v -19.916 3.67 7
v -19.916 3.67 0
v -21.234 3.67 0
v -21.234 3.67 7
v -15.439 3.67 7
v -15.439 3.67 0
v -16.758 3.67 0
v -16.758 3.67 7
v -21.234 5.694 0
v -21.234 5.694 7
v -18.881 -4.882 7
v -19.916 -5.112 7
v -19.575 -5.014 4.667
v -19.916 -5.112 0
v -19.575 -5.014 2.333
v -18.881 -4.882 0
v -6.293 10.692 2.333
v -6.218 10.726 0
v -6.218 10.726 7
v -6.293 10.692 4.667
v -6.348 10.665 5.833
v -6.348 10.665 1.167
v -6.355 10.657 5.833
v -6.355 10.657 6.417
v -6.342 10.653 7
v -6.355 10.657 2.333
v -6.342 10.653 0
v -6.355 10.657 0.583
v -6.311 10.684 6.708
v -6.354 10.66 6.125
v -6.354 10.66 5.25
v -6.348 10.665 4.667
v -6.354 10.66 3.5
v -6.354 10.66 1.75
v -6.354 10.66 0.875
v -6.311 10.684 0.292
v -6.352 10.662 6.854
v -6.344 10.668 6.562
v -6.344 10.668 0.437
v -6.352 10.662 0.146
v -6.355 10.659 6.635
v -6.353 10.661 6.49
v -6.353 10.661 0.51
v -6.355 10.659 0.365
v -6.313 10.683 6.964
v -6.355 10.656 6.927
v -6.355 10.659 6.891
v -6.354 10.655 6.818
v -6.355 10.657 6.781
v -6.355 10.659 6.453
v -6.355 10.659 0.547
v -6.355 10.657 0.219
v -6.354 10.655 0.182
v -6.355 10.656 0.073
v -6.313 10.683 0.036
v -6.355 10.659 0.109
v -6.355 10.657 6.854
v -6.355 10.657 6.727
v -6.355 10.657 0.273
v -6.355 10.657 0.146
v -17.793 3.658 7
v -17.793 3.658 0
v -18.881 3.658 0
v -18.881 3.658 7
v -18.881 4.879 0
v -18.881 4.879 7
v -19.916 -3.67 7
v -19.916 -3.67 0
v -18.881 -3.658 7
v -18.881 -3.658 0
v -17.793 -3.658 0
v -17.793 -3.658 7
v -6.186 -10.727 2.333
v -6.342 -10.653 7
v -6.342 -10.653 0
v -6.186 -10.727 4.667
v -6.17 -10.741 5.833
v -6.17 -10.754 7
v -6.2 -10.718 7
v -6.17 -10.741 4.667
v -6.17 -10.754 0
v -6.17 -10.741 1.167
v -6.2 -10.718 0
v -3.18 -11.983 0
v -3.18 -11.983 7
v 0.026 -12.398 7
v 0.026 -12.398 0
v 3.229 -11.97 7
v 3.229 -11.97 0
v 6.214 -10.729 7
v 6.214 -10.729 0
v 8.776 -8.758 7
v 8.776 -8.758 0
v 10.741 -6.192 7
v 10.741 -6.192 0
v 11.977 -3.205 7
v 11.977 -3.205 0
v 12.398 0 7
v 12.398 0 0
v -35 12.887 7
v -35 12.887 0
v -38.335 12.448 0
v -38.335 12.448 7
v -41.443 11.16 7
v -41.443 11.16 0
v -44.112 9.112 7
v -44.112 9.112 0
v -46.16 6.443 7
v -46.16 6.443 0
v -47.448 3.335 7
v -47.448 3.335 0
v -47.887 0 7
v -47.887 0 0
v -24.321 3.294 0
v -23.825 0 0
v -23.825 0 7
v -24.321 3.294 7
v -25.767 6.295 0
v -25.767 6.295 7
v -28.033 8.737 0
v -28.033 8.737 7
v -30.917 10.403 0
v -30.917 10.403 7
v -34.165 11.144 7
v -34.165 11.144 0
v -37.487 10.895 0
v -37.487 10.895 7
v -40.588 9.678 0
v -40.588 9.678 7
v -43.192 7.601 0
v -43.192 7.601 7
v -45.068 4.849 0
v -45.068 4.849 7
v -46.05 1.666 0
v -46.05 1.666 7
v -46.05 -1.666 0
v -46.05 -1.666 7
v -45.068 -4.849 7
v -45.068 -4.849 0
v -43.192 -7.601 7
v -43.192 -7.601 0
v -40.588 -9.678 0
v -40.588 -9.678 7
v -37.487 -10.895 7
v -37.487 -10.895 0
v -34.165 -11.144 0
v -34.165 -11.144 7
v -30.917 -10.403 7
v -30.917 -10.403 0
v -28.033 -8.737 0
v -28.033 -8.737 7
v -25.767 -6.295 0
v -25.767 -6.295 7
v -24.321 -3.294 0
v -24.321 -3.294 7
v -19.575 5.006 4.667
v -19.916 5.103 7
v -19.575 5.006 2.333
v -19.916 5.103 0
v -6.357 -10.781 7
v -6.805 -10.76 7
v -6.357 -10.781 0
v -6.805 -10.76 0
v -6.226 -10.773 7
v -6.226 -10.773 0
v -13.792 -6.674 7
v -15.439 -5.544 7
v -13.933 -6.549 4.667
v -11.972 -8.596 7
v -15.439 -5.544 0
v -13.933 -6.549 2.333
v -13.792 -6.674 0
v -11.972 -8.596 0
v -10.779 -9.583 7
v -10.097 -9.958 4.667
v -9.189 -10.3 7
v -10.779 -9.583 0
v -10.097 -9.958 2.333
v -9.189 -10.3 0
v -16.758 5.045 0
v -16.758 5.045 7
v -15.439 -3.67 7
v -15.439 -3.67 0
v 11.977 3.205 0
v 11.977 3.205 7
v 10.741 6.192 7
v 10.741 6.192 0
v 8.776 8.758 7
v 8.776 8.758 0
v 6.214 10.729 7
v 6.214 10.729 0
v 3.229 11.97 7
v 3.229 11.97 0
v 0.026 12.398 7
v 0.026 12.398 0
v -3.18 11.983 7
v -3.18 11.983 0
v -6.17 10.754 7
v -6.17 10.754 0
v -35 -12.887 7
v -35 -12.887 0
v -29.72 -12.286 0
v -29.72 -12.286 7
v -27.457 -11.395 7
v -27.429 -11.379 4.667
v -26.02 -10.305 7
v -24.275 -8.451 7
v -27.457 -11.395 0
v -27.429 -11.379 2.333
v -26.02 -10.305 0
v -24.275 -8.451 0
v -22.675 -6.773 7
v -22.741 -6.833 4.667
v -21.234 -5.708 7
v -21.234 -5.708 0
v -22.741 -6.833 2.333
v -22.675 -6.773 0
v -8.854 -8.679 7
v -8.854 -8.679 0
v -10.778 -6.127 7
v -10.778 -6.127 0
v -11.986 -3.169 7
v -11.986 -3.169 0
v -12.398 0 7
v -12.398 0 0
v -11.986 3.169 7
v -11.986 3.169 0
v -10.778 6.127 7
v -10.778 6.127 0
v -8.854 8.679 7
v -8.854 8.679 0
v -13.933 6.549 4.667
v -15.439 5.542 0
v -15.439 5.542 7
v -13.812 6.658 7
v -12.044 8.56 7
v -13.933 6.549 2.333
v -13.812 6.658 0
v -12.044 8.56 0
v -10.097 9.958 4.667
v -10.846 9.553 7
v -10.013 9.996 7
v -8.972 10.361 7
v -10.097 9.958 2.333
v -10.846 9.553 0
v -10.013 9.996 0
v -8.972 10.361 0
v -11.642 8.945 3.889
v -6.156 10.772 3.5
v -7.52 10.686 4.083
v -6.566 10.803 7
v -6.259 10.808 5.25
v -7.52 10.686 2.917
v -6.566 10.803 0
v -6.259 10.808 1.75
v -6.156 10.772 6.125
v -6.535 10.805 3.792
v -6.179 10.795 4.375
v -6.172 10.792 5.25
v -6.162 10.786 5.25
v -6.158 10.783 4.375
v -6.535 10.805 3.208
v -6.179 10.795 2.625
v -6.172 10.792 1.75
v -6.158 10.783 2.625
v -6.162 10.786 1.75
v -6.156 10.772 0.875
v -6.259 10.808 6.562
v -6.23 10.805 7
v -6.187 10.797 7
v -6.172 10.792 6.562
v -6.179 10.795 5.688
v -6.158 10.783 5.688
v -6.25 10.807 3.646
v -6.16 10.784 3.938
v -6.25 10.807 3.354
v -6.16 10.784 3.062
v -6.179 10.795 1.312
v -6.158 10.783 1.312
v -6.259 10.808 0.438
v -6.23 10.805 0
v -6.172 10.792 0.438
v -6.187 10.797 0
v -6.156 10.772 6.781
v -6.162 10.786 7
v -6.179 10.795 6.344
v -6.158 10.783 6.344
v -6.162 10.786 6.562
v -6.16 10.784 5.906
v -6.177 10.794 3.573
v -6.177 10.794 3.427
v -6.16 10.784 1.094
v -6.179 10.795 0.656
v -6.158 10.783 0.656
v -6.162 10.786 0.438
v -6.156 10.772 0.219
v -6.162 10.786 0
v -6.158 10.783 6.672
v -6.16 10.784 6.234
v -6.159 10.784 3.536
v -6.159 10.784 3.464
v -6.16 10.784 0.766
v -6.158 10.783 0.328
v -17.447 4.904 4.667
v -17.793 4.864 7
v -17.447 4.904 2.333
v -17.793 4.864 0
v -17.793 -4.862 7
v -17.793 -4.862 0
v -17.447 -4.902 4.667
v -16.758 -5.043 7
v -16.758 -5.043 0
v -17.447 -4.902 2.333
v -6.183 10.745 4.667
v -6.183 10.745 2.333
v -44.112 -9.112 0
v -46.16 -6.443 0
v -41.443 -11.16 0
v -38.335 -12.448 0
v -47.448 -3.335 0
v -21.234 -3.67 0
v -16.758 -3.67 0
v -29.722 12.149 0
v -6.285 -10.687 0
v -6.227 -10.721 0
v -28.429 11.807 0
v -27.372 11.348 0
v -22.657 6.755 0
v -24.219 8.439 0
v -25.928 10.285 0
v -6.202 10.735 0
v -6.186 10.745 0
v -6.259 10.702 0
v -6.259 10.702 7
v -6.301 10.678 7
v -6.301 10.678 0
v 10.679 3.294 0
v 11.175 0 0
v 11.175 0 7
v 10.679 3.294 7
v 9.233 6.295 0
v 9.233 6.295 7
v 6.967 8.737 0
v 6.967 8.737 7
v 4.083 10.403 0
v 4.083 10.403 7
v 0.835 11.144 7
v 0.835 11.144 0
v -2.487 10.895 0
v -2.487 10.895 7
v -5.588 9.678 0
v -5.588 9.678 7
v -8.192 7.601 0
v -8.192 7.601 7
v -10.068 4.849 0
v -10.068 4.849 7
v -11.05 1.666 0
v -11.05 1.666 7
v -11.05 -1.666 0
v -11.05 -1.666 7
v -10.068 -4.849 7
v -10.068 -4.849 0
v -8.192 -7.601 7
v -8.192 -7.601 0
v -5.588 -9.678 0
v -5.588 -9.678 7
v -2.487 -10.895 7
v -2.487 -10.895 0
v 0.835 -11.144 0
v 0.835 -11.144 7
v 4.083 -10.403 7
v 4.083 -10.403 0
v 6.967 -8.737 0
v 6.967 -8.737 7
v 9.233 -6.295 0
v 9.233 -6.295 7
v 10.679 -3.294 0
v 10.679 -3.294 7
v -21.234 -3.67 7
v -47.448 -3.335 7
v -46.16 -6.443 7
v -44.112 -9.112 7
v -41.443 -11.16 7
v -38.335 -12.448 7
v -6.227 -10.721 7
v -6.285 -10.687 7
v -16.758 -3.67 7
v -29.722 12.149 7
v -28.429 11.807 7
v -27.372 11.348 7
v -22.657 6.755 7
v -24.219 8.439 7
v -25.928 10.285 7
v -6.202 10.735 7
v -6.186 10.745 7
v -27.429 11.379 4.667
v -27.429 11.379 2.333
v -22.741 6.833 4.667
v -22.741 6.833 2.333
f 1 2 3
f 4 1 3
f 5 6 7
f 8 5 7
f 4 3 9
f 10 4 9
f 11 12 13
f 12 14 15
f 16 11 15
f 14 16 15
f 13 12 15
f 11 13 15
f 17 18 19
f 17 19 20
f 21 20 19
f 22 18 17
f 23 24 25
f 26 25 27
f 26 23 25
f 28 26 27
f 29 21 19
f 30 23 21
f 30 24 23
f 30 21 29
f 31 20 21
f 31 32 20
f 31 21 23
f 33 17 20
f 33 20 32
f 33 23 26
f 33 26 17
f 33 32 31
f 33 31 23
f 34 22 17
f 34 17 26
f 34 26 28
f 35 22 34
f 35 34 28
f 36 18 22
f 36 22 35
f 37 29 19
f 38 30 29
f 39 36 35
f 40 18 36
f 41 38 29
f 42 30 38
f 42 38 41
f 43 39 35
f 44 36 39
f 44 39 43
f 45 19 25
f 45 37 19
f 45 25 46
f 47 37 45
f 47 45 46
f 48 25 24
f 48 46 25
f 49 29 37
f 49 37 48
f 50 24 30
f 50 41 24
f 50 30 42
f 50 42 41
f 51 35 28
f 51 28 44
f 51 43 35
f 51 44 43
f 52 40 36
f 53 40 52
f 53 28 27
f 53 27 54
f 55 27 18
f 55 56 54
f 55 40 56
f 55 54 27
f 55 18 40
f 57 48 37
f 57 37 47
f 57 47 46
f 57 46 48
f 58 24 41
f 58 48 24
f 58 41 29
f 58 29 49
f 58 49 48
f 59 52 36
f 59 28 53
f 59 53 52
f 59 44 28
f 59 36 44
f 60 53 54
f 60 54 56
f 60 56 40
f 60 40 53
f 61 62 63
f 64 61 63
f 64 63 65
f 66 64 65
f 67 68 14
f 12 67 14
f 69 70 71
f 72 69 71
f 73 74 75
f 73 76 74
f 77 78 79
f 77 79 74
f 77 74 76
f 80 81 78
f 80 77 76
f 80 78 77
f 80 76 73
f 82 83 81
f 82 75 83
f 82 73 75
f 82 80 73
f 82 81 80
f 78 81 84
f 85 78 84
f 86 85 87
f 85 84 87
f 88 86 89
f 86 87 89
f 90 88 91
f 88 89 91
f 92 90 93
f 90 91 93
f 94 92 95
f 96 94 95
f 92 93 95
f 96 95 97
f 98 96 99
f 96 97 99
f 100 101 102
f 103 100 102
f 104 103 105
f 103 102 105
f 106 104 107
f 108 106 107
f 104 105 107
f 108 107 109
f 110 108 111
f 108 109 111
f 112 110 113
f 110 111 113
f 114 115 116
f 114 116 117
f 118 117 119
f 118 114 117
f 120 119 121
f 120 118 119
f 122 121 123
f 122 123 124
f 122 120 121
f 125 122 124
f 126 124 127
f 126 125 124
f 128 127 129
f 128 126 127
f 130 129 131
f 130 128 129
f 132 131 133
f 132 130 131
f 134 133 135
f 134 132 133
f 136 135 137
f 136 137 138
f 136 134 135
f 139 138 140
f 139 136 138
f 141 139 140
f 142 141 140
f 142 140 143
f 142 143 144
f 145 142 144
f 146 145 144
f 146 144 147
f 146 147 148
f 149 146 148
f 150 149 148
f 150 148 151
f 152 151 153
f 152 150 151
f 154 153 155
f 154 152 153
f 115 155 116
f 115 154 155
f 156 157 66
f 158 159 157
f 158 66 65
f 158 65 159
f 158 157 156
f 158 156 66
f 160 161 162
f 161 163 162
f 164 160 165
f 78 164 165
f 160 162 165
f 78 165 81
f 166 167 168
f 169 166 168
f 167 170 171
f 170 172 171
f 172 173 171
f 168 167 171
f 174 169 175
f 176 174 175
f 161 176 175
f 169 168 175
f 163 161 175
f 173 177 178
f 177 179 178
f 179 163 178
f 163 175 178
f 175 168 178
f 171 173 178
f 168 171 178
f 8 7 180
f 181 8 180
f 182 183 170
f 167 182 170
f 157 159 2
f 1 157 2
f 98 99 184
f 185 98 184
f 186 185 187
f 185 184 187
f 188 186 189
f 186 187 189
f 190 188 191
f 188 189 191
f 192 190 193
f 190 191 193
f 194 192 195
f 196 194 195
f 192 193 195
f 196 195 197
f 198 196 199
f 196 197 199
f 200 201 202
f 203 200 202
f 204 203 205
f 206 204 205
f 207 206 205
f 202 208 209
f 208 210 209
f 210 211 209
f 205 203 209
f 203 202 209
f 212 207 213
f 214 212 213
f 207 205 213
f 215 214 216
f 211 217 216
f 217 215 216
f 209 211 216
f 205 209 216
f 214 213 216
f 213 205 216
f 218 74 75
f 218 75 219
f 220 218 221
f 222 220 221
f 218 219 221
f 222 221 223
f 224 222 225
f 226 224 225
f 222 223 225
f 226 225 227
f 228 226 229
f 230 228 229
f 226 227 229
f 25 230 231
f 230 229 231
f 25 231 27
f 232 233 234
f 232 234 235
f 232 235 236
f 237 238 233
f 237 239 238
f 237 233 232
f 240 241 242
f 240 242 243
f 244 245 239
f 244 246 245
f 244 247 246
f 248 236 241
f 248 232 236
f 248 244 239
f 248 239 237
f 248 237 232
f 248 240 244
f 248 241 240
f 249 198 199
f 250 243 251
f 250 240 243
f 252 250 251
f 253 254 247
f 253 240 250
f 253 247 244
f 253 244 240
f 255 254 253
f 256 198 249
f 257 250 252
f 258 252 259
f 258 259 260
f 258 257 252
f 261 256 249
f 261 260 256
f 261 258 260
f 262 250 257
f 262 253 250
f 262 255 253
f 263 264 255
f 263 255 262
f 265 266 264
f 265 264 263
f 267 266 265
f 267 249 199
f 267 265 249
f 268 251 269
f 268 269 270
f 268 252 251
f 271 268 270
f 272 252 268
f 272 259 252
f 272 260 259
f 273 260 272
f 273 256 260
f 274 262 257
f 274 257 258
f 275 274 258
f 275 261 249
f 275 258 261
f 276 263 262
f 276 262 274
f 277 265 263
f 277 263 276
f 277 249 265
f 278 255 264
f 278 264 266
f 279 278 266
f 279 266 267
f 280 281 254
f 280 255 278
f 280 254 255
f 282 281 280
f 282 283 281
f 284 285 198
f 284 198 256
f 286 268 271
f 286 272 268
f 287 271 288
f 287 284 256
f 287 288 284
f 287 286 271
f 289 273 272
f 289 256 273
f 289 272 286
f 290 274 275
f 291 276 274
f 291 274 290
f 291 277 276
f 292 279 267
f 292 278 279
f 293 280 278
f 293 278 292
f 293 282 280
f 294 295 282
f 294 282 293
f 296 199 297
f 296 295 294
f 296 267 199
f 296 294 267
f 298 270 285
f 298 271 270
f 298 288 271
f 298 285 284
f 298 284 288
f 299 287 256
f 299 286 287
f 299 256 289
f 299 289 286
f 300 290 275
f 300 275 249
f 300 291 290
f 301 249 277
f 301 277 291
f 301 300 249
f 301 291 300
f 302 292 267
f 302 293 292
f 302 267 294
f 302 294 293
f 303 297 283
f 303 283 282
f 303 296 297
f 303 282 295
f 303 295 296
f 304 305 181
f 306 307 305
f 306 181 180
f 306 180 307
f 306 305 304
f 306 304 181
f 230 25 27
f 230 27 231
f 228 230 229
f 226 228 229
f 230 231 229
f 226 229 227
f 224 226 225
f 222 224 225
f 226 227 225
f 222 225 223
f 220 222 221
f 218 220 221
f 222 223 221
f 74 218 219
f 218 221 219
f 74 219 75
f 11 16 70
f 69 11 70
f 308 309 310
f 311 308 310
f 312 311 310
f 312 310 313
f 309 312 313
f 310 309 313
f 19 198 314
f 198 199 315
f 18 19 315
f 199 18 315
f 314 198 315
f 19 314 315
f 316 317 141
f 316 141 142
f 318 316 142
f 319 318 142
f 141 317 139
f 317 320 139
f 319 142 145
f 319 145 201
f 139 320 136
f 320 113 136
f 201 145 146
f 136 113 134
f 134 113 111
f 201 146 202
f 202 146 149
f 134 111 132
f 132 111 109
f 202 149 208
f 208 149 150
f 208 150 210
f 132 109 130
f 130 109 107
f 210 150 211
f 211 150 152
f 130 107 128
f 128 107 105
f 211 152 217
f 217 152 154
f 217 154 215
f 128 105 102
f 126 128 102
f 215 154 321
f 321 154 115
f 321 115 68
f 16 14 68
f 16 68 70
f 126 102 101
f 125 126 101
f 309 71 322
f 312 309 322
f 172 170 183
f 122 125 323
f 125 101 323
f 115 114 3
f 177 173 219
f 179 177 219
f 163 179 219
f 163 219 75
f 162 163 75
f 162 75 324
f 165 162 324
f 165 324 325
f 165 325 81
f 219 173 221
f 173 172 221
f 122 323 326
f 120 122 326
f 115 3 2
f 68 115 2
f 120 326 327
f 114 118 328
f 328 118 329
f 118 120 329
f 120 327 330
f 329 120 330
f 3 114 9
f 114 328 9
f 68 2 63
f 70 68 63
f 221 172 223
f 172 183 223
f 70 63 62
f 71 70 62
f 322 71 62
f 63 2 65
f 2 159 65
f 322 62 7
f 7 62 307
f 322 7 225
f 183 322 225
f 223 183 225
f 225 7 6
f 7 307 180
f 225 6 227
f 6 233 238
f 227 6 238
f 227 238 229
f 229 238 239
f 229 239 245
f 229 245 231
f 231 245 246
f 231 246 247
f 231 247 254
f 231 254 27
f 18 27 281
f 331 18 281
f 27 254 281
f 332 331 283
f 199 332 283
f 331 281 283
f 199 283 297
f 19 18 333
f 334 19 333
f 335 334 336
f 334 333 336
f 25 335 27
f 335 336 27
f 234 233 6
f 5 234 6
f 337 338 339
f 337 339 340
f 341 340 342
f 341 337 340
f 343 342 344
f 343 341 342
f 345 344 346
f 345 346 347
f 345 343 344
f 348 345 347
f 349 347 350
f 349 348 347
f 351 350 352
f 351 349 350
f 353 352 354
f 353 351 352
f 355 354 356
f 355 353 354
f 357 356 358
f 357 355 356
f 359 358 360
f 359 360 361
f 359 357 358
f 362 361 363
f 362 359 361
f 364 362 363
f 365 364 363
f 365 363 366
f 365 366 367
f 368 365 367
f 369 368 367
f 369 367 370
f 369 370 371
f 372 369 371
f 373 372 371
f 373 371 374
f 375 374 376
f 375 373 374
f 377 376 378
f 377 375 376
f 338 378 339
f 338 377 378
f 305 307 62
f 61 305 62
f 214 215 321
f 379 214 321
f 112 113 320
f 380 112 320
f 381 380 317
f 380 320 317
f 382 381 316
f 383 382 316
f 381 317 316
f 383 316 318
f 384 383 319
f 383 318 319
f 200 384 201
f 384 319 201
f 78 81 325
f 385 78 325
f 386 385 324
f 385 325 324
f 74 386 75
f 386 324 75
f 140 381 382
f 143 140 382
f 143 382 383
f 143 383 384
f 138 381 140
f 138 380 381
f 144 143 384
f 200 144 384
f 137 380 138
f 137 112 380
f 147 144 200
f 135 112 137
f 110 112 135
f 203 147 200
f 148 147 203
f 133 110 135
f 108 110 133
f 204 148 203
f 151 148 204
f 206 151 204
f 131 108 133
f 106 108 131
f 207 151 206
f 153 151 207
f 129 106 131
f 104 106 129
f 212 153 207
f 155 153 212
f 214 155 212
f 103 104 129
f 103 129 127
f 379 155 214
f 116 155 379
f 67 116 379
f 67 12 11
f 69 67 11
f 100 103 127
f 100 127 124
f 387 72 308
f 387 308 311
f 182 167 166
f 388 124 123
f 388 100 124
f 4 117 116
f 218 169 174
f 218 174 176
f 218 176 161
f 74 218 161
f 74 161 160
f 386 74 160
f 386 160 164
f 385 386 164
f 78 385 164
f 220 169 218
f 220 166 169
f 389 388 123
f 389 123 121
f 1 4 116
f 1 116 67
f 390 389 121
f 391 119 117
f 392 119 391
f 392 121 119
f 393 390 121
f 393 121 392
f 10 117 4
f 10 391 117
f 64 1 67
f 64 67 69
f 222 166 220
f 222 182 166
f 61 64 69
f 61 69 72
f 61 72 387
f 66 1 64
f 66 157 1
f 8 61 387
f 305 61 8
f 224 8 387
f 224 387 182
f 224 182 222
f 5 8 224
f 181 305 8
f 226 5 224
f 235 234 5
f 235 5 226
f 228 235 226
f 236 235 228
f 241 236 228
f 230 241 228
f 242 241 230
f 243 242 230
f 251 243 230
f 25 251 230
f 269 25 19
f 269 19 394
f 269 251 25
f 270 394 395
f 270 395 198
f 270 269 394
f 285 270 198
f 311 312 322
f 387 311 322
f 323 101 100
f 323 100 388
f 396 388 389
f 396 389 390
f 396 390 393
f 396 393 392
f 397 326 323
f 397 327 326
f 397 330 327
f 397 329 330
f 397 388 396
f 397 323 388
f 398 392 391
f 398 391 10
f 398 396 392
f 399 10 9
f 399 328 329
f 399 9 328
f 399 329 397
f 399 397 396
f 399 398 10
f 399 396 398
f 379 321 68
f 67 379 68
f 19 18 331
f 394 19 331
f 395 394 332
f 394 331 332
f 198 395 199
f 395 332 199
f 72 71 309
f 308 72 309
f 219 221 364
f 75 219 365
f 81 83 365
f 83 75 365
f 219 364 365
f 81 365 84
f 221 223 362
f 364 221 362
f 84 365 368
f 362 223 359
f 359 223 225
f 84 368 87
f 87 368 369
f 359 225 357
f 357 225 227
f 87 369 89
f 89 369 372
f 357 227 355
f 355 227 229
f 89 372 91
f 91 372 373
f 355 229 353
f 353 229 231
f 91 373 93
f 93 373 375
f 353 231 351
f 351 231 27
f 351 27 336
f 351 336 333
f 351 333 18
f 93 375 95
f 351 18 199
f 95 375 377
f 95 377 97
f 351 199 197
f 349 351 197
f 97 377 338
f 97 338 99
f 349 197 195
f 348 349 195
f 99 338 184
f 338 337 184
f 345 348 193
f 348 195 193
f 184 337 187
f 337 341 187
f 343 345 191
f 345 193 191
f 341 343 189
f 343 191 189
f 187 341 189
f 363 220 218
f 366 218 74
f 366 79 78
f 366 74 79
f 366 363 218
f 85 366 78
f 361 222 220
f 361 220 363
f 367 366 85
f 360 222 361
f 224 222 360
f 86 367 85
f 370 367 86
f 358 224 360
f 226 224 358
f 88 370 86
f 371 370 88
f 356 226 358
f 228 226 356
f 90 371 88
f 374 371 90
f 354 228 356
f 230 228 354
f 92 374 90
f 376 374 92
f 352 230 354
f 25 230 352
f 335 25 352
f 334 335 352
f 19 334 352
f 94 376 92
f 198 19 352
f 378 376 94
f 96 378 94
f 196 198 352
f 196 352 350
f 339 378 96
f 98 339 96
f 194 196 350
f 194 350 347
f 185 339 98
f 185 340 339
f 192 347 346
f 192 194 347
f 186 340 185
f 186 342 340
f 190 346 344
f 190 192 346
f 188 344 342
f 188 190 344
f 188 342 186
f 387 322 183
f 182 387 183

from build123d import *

# Parameters (mm, degrees)
F0_R     = 11.175
F1_DEPTH = 7
F2_DEPTH = 7


with BuildPart() as f1:
    # F0 (on Top) → F1 (new body)
    with BuildSketch(Plane.XY):
        with BuildLine():
            ThreePointArc((-6.3417691643, -10.6534334759), (-12.398132156, 0), (-6.3417691643, 10.6534334759))
            add(Edge.make_bspline(
                [(-6.2182208185, 10.7260156074), (-6.2898533195, 10.6910439898), (-6.3928576009, 10.6541938208), (-6.3417691643, 10.6534334759)],
                knots=[0.9757964746, 0.9757964746, 0.9757964746, 0.9757964746, 1, 1, 1, 1], degree=3))
            ThreePointArc((-6.2182208185, 10.7260156074), (-6.1938831268, 10.7400881174), (-6.1695135877, 10.7541054045))
            add(Edge.make_bspline(
                [(-15.4393427074, 5.5421058876), (-14.8912780033, 5.8141958954), (-12.9618337257, 7.102279887), (-11.3000086923, 10.432941862), (-5.9426922893, 10.9316099021), (-6.1695135877, 10.7541054045)],
                knots=[0.6163845414, 0.6163845414, 0.6163845414, 0.6163845414, 0.673080138, 0.8301918023, 0.9690223671, 0.9690223671, 0.9690223671, 0.9690223671], degree=3))
            Line((-15.4393427074, 5.5421058876), (-15.4393427074, 3.6695655435))
            Line((-15.4393427074, 3.6695655435), (-16.7575217783, 3.6695655435))
            Line((-16.7575217783, 3.6695655435), (-16.7575217783, 5.0453083157))
            add(Edge.make_bspline(
                [(-17.7929103374, 4.8639994661), (-17.4465794205, 4.8937805268), (-17.0995805588, 4.955405242), (-16.7575217783, 5.0453083157)],
                knots=[0.5397002226, 0.5397002226, 0.5397002226, 0.5397002226, 0.5727189225, 0.5727189225, 0.5727189225, 0.5727189225], degree=3))
            Line((-17.7929103374, 4.8639994661), (-17.7929103374, 3.6582010798))
            Line((-17.7929103374, 3.6582010798), (-18.8809223473, 3.6582010798))
            Line((-18.8809223473, 3.6582010798), (-18.8809223473, 4.8793821001))
            add(Edge.make_bspline(
                [(-19.9163109064, 5.1029895365), (-19.5767359601, 4.9956990886), (-19.2311209543, 4.920305821), (-18.8809223473, 4.8793821001)],
                knots=[0.470842737, 0.470842737, 0.470842737, 0.470842737, 0.5048637742, 0.5048637742, 0.5048637742, 0.5048637742], degree=3))
            Line((-19.9163109064, 5.1029895365), (-19.9163109064, 3.6695655435))
            Line((-19.9163109064, 3.6695655435), (-21.2344899774, 3.6695655435))
            Line((-21.2344899774, 3.6695655435), (-21.2344899774, 5.6935674142))
            add(Edge.make_bspline(
                [(-35, 12.8868968785), (-32.4764058242, 12.3842750738), (-26.8328403096, 12.6124271474), (-23.8683963588, 7.6040613235), (-21.7601893659, 6.0007013665), (-21.2344899774, 5.6935674142)],
                knots=[0, 0, 0, 0, 0.1926872335, 0.3699145532, 0.4256387724, 0.4256387724, 0.4256387724, 0.4256387724], degree=3))
            ThreePointArc((-35, 12.8868968785), (-44.1124121712, 9.1124121712), (-47.8868968785, 0))
            ThreePointArc((-47.8868968785, 0), (-44.1124121712, -9.1124121712), (-35, -12.8868968785))
            add(Edge.make_bspline(
                [(-35, -12.8868968785), (-32.2373997542, -12.7407331929), (-26.9339365175, -12.4601619558), (-23.8740309058, -7.6057967092), (-21.7579622329, -6.0142972002), (-21.2344899774, -5.7083986722)],
                knots=[0, 0, 0, 0, 0.1926872335, 0.3699145532, 0.4253332887, 0.4253332887, 0.4253332887, 0.4253332887], degree=3))
            Line((-21.2344899774, -5.7083986722), (-21.2344899774, -3.6695655435))
            Line((-21.2344899774, -3.6695655435), (-19.9163109064, -3.6695655435))
            Line((-19.9163109064, -3.6695655435), (-19.9163109064, -5.1124505346))
            add(Edge.make_bspline(
                [(-19.9163109064, -5.1124505346), (-19.5763428722, -5.0028512158), (-19.230767931, -4.92507808), (-18.8809223473, -4.8821444426)],
                knots=[0.4705904371, 0.4705904371, 0.4705904371, 0.4705904371, 0.5047615456, 0.5047615456, 0.5047615456, 0.5047615456], degree=3))
            Line((-18.8809223473, -4.8821444426), (-18.8809223473, -3.6582010798))
            Line((-18.8809223473, -3.6582010798), (-17.7929103374, -3.6582010798))
            Line((-17.7929103374, -3.6582010798), (-17.7929103374, -4.8623260426))
            add(Edge.make_bspline(
                [(-17.7929103374, -4.8623260426), (-17.4466841273, -4.8914015711), (-17.0998134145, -4.9529921722), (-16.7575217783, -5.0434919944)],
                knots=[0.5398122313, 0.5398122313, 0.5398122313, 0.5398122313, 0.5730388079, 0.5730388079, 0.5730388079, 0.5730388079], degree=3))
            Line((-16.7575217783, -5.0434919944), (-16.7575217783, -3.6695655435))
            Line((-16.7575217783, -3.6695655435), (-15.4393427074, -3.6695655435))
            Line((-15.4393427074, -3.6695655435), (-15.4393427074, -5.5440194618))
            add(Edge.make_bspline(
                [(-15.4393427074, -5.5440194618), (-14.8958951228, -5.8155793715), (-12.9585668754, -7.1083770223), (-11.142482926, -10.471002969), (-6.2414235549, -10.8584930729), (-6.1695135877, -10.7541054045)],
                knots=[0.616851465, 0.616851465, 0.616851465, 0.616851465, 0.673080138, 0.8301918023, 0.9690223671, 0.9690223671, 0.9690223671, 0.9690223671], degree=3))
            ThreePointArc((-6.1695135877, -10.7541054045), (-6.2558438866, -10.7041159478), (-6.3417691643, -10.6534334759))
        make_face()
        with Locations((-35, 0)):
            Circle(F0_R, mode=Mode.SUBTRACT)
    extrude(amount=F1_DEPTH)


with BuildPart() as f2:
    # F0 (on Top) → F2 (new body)
    with BuildSketch(Plane.XY):
        with BuildLine():
            ThreePointArc((-6.2182208185, 10.7260156074), (-6.2800998506, 10.6899030316), (-6.3417691643, 10.6534334759))
            ThreePointArc((-6.3417691643, 10.6534334759), (-12.398132156, 0), (-6.3417691643, -10.6534334759))
            add(Edge.make_bspline(
                [(-6.1695135877, -10.7541054045), (-6.1534681256, -10.7308131066), (-6.2483131103, -10.6932731933), (-6.3417691643, -10.6534334759)],
                knots=[0.9690223671, 0.9690223671, 0.9690223671, 0.9690223671, 1, 1, 1, 1], degree=3))
            ThreePointArc((-6.1695135877, -10.7541054045), (6.2138247545, -10.7285629456), (12.398132156, 0))
            ThreePointArc((12.398132156, 0), (6.2138247545, 10.7285629456), (-6.1695135877, 10.7541054045))
            add(Edge.make_bspline(
                [(-6.1695135877, 10.7541054045), (-6.1805811207, 10.7454442386), (-6.1981722407, 10.7358034996), (-6.2182208185, 10.7260156074)],
                knots=[0.9690223671, 0.9690223671, 0.9690223671, 0.9690223671, 0.9757964746, 0.9757964746, 0.9757964746, 0.9757964746], degree=3))
        make_face()
        Circle(F0_R, mode=Mode.SUBTRACT)
    extrude(amount=F2_DEPTH)


solid = Compound([f1.part, f2.part])
